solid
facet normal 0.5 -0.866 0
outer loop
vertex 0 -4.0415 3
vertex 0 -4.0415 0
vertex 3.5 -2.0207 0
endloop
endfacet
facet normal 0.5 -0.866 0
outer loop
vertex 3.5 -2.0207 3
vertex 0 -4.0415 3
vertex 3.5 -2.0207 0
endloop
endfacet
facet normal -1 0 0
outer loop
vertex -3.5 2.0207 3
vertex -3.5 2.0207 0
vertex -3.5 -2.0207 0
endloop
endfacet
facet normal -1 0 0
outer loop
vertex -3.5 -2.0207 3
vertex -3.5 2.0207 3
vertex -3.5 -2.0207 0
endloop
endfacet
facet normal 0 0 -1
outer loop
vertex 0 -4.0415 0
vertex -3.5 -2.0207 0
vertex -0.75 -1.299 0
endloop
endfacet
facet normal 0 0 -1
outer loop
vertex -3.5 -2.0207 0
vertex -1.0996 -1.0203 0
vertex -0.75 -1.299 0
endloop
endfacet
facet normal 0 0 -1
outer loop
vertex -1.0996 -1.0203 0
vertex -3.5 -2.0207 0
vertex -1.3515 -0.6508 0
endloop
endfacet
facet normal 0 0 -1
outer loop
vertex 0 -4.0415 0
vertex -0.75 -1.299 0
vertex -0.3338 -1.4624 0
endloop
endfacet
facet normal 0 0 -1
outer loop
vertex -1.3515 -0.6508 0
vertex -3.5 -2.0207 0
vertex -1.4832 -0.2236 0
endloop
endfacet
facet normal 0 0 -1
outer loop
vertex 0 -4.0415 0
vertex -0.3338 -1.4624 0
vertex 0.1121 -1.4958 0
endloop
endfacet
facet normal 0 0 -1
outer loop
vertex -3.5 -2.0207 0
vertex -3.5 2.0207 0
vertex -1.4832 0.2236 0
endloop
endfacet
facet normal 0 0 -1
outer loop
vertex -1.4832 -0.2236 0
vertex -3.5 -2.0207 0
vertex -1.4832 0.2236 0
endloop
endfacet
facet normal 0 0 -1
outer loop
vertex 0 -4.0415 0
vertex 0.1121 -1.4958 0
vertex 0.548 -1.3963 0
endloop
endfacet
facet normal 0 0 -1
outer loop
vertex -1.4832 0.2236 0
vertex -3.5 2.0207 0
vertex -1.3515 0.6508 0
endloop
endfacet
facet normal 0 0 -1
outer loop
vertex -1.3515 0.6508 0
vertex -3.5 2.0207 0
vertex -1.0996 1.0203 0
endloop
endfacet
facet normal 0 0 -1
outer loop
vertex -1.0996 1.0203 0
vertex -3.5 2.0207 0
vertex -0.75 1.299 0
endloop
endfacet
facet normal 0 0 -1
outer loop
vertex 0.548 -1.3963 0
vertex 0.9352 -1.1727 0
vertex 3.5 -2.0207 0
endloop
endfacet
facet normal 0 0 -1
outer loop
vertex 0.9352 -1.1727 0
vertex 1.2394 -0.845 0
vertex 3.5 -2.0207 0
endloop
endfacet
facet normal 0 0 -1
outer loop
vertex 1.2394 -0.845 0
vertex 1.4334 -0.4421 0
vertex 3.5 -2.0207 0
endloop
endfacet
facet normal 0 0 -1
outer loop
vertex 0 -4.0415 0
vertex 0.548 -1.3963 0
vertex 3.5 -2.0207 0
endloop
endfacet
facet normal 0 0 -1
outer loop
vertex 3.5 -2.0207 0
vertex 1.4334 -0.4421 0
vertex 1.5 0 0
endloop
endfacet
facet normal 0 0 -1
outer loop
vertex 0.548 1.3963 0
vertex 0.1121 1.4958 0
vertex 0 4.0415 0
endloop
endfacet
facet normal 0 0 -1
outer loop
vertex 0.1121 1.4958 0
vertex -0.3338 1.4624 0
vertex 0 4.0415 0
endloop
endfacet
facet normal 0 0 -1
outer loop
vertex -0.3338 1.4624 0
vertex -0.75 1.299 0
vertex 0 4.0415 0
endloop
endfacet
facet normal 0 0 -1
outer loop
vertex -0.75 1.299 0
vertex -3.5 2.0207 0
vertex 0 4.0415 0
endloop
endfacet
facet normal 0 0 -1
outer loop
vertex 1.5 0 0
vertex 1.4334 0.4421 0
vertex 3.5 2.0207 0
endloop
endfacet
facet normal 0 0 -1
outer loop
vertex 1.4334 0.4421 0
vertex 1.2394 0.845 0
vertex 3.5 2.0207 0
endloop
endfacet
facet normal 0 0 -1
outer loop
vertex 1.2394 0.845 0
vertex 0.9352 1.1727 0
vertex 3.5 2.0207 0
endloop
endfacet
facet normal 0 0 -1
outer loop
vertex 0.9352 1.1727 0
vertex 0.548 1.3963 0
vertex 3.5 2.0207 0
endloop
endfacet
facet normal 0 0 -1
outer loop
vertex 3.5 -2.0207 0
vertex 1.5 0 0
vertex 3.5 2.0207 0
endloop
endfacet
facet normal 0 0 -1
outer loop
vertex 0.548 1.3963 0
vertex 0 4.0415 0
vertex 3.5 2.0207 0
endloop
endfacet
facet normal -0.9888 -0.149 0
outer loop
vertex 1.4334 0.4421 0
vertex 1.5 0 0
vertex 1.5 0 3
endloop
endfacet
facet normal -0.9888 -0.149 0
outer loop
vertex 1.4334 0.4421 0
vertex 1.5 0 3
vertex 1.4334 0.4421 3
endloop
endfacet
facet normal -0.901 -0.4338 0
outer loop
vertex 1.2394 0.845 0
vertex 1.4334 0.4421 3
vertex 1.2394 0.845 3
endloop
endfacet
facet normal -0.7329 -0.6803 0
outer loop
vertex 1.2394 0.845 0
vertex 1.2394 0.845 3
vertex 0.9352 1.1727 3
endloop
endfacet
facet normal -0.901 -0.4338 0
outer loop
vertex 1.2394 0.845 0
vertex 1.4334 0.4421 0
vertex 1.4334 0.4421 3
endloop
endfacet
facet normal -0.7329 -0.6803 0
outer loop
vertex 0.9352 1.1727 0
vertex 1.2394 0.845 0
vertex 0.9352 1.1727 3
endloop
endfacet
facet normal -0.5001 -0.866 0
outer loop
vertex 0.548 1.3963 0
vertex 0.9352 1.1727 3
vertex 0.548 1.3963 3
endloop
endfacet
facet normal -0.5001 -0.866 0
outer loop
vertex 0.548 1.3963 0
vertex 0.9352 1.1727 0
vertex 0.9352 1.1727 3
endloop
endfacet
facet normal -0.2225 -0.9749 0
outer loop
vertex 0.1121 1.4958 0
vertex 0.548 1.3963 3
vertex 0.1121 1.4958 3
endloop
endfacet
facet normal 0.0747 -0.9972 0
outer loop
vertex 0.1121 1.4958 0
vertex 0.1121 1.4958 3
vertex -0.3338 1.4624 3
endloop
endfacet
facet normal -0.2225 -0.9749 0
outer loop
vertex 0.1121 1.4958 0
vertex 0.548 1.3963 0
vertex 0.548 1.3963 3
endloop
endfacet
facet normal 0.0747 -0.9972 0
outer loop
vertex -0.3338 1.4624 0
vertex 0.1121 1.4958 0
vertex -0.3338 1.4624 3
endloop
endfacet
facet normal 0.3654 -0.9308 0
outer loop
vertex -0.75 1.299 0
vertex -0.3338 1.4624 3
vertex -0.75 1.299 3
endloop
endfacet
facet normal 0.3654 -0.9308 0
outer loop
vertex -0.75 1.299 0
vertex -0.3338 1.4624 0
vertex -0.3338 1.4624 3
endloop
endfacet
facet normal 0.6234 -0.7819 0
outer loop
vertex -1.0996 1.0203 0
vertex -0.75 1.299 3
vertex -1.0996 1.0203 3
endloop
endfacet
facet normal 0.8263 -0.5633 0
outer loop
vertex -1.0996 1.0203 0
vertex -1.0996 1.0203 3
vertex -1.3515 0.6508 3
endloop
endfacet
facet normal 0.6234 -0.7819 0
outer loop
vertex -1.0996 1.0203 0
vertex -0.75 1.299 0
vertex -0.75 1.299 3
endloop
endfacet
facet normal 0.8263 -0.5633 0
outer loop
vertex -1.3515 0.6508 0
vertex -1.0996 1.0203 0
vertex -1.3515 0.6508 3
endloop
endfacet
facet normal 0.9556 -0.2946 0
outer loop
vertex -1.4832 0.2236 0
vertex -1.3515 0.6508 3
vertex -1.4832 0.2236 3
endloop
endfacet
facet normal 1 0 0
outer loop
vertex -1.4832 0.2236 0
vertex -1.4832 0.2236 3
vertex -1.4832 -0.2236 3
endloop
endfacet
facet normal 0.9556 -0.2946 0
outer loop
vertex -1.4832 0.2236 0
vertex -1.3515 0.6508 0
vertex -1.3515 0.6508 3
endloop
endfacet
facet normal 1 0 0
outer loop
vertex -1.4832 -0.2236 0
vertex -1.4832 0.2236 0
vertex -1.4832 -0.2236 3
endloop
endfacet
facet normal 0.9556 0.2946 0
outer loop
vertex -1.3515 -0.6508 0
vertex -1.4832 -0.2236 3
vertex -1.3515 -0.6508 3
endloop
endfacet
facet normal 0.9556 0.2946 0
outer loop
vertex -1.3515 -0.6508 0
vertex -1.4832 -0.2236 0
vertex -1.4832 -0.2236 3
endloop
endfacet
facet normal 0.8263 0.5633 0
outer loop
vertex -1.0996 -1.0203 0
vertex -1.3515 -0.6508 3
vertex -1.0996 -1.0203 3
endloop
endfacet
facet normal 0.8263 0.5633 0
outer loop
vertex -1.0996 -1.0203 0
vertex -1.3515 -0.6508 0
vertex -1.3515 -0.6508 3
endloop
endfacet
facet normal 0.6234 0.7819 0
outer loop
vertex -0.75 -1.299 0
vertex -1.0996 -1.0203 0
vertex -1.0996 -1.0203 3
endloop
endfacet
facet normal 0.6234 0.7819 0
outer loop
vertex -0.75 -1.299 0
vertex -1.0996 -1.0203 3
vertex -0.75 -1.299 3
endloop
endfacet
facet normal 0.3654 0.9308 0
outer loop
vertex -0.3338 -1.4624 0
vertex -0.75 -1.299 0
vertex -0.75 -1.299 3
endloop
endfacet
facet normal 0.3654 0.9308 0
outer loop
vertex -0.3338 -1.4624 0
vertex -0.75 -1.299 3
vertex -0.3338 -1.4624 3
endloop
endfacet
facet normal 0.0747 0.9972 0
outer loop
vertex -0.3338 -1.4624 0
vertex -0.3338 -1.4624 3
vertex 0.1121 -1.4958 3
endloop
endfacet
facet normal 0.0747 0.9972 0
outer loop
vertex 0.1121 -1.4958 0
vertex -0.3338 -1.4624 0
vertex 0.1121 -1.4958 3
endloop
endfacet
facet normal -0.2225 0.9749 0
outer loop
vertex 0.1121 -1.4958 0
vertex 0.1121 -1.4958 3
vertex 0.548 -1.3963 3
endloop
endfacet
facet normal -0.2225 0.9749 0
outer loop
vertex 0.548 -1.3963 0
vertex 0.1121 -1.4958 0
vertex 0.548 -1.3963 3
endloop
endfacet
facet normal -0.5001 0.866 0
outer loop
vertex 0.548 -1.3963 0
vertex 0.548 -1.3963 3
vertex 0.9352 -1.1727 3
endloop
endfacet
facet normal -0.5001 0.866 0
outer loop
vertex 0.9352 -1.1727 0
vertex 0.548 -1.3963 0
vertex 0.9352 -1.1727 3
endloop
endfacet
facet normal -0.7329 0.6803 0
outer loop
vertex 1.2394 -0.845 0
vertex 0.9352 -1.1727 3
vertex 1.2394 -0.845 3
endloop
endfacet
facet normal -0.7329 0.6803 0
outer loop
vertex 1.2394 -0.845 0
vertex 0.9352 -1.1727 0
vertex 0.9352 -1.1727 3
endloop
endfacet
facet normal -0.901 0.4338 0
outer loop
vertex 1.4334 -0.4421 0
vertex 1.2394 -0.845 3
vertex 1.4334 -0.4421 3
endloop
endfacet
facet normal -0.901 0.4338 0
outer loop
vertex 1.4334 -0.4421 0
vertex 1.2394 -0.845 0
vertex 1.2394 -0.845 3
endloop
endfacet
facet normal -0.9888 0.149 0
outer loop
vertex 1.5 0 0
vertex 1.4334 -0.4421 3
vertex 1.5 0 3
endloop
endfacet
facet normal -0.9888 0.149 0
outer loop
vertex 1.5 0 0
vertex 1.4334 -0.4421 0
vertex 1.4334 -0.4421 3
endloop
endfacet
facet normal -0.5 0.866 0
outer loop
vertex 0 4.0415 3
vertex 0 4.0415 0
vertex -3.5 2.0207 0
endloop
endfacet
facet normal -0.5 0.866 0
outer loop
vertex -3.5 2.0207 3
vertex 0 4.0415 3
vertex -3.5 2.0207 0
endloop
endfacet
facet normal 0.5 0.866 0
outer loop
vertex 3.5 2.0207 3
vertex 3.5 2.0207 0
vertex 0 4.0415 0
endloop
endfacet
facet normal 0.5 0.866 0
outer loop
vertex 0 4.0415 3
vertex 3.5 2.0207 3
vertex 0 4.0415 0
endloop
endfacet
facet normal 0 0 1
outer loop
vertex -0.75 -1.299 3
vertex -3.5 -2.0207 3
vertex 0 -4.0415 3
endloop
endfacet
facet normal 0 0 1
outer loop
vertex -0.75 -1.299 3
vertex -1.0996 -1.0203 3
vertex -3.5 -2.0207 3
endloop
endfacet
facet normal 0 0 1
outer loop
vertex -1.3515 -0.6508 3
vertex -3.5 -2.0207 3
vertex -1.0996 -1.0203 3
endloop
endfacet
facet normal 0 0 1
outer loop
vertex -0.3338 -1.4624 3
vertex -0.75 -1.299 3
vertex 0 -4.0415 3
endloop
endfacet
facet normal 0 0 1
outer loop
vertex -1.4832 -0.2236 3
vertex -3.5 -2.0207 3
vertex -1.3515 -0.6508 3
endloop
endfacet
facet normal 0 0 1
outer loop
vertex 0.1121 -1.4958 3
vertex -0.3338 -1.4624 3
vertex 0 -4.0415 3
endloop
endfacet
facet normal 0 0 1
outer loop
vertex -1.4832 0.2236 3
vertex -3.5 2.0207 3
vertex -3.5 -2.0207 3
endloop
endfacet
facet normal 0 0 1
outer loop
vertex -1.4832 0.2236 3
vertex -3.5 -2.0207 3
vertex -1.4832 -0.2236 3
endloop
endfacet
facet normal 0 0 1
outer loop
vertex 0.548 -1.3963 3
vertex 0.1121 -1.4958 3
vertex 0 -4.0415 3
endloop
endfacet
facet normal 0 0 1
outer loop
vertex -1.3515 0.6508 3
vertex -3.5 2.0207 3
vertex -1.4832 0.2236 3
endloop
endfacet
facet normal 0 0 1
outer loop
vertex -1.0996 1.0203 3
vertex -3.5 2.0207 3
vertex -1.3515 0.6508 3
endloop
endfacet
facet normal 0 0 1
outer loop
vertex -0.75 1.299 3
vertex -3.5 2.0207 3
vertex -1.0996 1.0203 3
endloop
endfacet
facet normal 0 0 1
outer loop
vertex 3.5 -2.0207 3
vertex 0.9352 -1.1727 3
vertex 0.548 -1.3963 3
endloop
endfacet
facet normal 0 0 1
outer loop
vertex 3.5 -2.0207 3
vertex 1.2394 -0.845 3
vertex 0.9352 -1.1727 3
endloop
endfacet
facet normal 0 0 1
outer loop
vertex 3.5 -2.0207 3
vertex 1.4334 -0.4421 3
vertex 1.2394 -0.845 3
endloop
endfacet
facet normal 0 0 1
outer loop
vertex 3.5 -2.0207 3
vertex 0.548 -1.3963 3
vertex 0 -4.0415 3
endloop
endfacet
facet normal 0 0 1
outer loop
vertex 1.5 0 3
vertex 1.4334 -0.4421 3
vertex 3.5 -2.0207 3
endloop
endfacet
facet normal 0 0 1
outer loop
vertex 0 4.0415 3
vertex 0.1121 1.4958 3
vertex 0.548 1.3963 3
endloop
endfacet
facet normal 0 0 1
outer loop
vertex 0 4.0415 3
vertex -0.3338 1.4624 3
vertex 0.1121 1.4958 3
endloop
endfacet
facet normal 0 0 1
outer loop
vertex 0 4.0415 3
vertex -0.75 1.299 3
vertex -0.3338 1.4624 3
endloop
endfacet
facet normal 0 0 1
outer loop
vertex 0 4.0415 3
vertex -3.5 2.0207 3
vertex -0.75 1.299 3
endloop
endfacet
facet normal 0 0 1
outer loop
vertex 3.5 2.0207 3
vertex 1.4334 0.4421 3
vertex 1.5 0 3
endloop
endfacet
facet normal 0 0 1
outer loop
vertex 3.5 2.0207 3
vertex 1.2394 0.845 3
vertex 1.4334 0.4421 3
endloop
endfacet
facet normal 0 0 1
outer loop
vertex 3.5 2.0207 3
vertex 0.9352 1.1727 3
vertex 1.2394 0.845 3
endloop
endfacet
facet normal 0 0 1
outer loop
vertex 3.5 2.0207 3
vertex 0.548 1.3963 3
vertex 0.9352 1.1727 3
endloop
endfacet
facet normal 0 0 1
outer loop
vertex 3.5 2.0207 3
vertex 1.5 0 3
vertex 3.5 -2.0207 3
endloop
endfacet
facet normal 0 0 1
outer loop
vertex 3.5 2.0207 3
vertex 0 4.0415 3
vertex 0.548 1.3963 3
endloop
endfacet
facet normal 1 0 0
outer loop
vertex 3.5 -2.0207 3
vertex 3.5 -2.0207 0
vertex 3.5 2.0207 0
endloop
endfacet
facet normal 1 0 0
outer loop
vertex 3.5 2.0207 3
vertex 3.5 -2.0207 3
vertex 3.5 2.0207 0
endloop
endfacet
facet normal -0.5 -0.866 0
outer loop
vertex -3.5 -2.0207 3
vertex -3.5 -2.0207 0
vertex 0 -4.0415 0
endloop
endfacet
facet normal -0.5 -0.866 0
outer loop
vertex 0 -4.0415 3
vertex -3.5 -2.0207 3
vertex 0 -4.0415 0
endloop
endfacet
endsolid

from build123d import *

# Parameters (mm, degrees)
F0_R     = 1.5
F1_DEPTH = 3


with BuildPart() as f1:
    # F0 (on Top) → F1 (new body)
    with BuildSketch(Plane.XY):
        Polygon((-3.5, 2.020726), (-3.5, -2.020726), (0, -4.041452), (3.5, -2.020726), (3.5, 2.020726), (0, 4.041452), align=None)
        Circle(F0_R, mode=Mode.SUBTRACT)
    extrude(amount=F1_DEPTH)


solid = f1.part
